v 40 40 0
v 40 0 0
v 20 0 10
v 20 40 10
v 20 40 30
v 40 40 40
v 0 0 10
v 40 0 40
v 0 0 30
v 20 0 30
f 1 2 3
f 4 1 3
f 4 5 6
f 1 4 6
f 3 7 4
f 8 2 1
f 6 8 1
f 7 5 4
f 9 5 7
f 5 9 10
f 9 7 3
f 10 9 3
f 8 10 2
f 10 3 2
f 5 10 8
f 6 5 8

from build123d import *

# Parameters (mm, degrees)
SKETCH1_W           = 40
SKETCH1_H           = 40
BOSS_EXTRUDE1_DEPTH = 40
CUT_EXTRUDE1_DEPTH  = 40
SKETCH3_W           = 20
SKETCH3_H           = 10
CUT_EXTRUDE2_DEPTH  = 40


with BuildPart() as part:
    # Sketch1 → Boss-Extrude1 (new body)
    with BuildSketch(Plane.XY):
        with Locations((20, 20)):
            Rectangle(SKETCH1_W, SKETCH1_H)
    extrude(amount=BOSS_EXTRUDE1_DEPTH)

    # Sketch2 → Cut-Extrude1 (cut)
    with BuildSketch(Plane.XY.offset(40)):
        Polygon((0, 40), (20, 40), (0, 0), align=None)
    extrude(amount=-CUT_EXTRUDE1_DEPTH, mode=Mode.SUBTRACT)

    # Sketch3 → Cut-Extrude2 (cut)
    with BuildSketch(Plane.XZ):
        with Locations((10, 5)):
            Rectangle(SKETCH3_W, SKETCH3_H)
        Polygon((40, 0), (20, 10), (20, 0), align=None)
        with Locations((10, 35)):
            Rectangle(SKETCH3_W, SKETCH3_H)
        Polygon((20, 40), (20, 30), (40, 40), align=None)
    extrude(amount=-CUT_EXTRUDE2_DEPTH, mode=Mode.SUBTRACT)


solid = part.part
